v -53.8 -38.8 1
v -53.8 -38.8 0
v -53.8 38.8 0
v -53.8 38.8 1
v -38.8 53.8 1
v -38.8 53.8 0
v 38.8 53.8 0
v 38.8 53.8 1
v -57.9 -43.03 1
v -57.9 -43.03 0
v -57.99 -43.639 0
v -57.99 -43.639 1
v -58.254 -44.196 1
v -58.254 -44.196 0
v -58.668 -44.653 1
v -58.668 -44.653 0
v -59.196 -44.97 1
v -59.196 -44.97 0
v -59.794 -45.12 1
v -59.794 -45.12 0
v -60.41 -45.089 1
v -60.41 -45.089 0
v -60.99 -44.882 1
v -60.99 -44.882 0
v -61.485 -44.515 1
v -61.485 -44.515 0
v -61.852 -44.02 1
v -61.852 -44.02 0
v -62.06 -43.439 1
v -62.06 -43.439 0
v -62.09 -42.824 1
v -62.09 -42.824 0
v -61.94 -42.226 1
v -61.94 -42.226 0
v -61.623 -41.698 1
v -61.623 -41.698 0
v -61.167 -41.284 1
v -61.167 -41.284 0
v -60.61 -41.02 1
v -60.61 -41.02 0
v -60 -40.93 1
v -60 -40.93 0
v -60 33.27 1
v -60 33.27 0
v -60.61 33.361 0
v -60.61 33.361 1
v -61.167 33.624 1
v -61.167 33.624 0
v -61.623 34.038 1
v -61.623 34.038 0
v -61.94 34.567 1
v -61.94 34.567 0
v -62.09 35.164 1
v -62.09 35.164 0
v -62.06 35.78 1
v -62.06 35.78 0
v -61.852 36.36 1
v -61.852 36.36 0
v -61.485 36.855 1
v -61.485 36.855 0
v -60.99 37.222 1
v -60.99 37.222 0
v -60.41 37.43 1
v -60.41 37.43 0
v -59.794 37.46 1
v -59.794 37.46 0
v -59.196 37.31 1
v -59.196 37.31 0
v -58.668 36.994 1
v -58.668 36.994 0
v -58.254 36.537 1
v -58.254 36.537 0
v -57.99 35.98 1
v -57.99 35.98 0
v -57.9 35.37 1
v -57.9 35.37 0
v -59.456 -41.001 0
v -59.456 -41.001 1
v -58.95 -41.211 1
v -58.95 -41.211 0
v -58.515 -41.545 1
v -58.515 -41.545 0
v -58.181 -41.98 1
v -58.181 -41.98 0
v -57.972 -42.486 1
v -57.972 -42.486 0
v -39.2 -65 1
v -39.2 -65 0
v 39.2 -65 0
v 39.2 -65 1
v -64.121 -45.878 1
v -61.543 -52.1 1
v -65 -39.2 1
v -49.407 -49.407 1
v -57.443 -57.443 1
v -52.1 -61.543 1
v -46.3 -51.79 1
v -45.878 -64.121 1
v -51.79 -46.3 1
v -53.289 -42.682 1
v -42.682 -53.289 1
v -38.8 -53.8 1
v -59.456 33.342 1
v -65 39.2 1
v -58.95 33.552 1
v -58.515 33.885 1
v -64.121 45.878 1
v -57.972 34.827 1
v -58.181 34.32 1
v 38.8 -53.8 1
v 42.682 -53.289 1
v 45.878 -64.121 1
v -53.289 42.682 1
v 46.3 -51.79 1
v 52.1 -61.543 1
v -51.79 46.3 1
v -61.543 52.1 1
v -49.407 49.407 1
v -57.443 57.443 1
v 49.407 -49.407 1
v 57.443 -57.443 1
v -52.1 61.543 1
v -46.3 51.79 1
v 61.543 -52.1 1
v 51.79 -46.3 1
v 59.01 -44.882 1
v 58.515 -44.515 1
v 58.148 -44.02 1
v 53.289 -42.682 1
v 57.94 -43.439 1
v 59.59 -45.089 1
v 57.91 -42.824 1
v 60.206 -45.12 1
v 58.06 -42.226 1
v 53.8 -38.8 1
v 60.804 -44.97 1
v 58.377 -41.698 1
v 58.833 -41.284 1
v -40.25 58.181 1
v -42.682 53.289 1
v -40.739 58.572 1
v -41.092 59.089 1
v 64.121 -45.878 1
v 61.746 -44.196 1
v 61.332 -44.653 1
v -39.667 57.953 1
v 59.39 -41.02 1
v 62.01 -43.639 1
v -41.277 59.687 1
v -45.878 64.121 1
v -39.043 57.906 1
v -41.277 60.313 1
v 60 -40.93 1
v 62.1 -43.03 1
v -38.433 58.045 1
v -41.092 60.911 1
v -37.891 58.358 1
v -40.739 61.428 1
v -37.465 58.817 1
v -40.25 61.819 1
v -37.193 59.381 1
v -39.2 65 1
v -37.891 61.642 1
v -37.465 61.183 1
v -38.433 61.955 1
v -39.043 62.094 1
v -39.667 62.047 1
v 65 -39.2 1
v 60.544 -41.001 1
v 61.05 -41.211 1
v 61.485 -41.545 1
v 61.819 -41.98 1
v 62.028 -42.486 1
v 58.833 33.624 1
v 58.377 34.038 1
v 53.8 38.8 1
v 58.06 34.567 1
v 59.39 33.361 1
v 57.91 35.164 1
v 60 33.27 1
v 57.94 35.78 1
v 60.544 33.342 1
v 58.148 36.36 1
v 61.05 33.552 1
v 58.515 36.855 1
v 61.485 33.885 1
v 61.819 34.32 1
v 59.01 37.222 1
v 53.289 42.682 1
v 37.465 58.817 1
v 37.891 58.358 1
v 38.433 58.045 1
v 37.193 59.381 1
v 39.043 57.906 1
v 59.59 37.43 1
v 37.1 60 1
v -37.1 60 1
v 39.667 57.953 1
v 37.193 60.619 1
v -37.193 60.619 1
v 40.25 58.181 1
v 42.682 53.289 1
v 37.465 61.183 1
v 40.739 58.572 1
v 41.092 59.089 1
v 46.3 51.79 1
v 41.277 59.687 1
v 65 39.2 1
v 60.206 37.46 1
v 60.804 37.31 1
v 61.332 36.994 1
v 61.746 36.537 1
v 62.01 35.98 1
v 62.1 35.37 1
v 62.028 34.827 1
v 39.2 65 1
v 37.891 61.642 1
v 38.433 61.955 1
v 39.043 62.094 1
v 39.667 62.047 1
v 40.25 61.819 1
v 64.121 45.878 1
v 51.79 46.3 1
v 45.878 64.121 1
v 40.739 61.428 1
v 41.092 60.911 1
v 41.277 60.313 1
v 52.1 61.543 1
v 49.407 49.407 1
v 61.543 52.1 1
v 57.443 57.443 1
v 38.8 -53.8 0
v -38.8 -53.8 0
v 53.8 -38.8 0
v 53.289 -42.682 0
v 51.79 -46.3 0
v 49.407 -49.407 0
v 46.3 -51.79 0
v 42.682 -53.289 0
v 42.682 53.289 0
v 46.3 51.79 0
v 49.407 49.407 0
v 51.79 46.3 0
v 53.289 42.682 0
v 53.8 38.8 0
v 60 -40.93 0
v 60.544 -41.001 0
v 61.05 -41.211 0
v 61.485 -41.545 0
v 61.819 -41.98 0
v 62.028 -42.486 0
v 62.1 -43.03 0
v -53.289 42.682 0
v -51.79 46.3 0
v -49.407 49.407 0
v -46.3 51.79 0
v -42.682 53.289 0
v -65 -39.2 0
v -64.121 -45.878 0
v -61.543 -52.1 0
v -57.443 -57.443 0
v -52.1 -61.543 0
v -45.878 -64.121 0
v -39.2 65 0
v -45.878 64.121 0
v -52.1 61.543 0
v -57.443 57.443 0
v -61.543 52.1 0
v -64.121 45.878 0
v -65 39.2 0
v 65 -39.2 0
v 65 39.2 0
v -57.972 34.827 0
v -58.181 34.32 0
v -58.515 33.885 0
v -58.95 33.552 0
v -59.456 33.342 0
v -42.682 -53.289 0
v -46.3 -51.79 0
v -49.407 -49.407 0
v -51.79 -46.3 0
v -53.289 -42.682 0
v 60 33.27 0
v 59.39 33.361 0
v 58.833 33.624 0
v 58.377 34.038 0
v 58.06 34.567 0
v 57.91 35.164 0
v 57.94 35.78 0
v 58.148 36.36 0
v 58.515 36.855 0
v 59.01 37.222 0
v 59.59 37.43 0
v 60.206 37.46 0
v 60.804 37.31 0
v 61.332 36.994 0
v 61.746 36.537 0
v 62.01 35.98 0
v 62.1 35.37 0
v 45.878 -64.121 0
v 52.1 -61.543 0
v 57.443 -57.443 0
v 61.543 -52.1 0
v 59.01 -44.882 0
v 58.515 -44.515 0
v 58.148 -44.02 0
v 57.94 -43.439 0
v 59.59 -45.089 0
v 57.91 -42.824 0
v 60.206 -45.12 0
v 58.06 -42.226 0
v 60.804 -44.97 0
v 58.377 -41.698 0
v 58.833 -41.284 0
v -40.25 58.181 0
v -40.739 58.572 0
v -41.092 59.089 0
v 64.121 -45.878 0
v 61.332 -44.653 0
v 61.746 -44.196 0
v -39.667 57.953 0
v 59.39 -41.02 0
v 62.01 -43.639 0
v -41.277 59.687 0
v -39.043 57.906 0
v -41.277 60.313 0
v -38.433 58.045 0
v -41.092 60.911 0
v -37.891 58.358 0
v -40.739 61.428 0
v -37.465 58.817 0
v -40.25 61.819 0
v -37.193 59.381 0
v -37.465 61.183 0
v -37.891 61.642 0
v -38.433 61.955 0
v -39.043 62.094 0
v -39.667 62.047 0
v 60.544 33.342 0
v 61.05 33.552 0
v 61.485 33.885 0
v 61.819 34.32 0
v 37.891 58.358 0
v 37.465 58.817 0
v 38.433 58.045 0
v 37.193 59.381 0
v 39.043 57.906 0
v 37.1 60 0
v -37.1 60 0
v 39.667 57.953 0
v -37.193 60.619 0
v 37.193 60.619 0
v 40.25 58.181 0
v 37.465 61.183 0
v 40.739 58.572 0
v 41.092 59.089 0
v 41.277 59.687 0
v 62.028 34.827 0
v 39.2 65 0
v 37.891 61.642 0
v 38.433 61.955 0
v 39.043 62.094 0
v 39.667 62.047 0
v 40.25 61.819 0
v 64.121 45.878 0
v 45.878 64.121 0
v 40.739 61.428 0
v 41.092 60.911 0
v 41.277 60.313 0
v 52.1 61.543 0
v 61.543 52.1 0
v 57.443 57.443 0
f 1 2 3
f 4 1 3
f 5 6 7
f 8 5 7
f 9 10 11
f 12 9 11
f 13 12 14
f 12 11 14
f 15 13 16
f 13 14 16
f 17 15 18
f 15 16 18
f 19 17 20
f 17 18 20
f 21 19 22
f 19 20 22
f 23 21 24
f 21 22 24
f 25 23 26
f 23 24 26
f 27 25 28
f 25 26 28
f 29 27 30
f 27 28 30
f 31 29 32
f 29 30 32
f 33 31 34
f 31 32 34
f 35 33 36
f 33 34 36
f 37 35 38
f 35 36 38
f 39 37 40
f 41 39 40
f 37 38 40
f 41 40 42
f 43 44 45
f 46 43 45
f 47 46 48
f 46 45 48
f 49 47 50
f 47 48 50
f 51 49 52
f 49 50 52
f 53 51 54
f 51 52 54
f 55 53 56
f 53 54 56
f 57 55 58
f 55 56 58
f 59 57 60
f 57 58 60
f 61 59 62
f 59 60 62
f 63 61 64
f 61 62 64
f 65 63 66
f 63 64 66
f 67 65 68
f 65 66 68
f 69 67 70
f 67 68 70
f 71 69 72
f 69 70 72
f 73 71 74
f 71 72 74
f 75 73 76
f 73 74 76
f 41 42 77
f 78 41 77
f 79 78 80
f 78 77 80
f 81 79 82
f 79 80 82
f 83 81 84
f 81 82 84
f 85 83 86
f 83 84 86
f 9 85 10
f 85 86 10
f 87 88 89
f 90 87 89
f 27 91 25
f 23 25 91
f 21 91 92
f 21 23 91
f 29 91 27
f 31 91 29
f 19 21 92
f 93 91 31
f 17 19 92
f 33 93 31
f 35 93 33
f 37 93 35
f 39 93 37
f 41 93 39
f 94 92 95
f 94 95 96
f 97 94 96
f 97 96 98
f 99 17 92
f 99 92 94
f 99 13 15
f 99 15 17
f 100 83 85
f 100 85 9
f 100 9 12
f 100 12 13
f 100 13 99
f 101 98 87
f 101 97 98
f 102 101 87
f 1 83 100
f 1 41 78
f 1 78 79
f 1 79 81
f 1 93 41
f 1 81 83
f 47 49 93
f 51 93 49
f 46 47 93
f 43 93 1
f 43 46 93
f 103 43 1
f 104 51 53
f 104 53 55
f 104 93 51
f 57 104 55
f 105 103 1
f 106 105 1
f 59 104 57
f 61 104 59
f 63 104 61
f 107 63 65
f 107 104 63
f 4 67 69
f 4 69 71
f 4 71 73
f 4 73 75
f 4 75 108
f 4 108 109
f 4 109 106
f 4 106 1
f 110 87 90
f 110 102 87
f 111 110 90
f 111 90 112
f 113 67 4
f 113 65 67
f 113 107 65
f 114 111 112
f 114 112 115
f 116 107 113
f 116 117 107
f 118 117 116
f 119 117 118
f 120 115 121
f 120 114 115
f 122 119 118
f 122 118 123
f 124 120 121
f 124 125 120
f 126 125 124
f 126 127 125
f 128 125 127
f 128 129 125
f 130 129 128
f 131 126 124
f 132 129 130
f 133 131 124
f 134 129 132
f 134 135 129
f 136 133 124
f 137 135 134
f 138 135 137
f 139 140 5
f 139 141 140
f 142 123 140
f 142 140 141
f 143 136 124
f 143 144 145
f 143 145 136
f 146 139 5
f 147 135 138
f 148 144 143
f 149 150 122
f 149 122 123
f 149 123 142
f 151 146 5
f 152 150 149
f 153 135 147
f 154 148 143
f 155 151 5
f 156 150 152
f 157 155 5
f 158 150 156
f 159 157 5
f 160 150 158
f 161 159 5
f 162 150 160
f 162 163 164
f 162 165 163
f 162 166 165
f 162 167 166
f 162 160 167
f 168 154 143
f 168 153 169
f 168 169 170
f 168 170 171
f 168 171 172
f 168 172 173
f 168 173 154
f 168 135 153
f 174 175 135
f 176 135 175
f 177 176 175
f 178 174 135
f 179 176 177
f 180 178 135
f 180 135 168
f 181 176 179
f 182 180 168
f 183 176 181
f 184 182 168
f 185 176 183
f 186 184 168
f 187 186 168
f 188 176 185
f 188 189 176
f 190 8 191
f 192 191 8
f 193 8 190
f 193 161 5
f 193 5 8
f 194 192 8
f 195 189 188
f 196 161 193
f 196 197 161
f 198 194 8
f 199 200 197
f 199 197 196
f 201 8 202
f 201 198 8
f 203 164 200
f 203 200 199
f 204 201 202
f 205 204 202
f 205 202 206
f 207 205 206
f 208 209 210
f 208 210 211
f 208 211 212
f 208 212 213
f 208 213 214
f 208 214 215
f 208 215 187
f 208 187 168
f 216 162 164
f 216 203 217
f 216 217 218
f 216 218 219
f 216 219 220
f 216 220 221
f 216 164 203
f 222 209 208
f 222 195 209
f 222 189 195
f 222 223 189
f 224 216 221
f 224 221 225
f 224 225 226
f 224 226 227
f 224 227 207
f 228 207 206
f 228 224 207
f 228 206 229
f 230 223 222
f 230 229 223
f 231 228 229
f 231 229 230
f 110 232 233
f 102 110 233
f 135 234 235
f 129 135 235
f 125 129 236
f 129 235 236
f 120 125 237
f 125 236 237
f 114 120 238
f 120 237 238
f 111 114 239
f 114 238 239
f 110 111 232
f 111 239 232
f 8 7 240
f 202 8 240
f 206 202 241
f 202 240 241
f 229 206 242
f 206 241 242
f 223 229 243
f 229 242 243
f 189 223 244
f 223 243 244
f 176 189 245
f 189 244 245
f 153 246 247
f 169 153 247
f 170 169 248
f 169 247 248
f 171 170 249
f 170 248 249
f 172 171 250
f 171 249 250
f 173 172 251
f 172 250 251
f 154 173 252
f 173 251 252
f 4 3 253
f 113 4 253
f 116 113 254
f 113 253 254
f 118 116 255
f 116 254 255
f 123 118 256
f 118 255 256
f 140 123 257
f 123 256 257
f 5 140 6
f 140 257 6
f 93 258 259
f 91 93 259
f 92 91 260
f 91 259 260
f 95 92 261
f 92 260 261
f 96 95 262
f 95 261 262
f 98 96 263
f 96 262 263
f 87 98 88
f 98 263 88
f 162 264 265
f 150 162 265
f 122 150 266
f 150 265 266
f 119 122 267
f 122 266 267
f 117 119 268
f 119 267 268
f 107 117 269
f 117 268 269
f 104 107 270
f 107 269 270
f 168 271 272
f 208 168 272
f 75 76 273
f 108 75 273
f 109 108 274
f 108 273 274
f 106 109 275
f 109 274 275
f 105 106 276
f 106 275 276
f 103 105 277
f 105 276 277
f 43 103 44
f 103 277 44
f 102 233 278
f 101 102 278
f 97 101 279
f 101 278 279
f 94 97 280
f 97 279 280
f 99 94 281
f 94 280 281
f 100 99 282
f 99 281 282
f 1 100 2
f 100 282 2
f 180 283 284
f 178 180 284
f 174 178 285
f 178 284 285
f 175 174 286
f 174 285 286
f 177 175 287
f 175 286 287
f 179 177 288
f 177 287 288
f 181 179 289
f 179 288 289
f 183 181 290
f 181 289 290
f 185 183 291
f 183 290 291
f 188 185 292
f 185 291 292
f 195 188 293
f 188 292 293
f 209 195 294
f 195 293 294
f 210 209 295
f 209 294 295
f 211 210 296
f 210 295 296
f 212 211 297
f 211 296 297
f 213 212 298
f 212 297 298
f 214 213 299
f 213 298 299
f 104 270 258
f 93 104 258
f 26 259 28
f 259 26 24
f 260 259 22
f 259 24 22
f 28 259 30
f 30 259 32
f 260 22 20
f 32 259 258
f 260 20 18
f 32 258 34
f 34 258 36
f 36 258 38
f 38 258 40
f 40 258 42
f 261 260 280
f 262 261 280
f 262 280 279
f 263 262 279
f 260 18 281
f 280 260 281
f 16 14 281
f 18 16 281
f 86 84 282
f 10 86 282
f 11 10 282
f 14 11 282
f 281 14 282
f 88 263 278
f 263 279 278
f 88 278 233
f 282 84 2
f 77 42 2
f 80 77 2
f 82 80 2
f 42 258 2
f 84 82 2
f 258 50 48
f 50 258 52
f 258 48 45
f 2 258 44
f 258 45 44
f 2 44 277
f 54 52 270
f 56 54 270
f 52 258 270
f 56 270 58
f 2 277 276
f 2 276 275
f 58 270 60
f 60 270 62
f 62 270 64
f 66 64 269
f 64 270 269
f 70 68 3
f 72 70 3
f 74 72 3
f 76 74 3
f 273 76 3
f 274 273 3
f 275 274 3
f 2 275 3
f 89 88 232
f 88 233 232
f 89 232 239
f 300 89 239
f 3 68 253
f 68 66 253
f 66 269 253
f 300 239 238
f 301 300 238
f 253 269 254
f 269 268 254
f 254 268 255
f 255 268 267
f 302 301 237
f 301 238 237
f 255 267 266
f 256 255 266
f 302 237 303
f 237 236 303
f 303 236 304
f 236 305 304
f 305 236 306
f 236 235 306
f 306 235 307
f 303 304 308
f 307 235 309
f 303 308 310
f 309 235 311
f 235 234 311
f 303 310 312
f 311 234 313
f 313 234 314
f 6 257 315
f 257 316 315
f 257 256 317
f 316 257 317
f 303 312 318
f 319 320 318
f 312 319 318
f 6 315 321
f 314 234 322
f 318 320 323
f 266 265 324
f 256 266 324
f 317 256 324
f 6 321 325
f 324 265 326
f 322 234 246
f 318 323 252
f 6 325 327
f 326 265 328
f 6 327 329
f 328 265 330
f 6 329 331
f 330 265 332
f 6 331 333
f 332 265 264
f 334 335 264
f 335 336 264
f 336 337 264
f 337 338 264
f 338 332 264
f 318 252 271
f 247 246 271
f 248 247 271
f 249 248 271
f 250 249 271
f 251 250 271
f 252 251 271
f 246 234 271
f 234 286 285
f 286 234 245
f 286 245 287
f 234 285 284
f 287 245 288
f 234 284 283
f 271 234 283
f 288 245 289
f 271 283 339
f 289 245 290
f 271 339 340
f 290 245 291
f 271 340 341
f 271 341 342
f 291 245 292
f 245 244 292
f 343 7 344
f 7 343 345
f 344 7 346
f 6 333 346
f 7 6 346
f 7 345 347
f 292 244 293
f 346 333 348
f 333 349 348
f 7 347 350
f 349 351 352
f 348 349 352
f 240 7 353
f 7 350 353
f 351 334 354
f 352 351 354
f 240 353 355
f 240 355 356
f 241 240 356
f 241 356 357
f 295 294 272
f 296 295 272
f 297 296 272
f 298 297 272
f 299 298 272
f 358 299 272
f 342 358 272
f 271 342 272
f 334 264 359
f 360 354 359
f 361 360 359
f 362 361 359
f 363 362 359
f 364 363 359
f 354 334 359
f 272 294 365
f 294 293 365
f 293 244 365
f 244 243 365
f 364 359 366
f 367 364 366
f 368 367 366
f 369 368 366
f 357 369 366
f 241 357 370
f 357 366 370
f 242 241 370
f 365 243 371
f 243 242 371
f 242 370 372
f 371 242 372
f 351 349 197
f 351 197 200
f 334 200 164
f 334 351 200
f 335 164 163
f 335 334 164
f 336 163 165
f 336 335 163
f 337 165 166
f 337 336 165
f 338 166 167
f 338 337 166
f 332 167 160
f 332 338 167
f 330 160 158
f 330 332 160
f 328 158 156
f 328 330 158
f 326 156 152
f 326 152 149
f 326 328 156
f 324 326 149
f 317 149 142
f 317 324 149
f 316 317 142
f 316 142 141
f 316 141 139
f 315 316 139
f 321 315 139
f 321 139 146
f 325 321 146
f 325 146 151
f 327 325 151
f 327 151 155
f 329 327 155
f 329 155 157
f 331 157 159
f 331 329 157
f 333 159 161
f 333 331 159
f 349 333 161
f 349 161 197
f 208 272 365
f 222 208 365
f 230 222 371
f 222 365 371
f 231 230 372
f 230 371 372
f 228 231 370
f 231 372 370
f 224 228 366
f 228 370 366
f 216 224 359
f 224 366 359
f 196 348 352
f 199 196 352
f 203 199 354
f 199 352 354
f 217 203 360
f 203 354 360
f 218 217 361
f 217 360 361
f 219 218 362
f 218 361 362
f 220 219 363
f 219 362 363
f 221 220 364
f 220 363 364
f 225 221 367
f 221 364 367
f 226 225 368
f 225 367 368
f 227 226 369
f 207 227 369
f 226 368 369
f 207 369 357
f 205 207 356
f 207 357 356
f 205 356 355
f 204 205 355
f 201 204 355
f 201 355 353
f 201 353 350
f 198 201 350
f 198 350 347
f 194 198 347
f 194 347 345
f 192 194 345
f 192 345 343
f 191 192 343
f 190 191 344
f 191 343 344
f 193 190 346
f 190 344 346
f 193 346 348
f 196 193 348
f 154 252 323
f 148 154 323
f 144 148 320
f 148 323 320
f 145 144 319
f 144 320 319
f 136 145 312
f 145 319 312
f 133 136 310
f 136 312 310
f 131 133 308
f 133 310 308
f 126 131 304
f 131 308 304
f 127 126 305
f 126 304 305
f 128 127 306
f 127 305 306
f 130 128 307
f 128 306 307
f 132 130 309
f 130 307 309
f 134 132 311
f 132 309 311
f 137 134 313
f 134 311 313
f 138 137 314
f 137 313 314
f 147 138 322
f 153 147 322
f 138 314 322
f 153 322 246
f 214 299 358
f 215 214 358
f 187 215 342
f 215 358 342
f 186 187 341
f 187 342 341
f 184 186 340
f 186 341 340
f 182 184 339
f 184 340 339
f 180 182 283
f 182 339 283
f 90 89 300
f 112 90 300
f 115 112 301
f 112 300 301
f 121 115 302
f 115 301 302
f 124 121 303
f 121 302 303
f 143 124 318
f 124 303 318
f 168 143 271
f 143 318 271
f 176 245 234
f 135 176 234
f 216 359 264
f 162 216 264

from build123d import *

# Parameters (mm, degrees)
F0_R     = 2.1
F1_DEPTH = 1


with BuildPart() as f1:
    # F0 (on Top) → F1 (new body)
    with BuildSketch(Plane.XY):
        with BuildLine():
            ThreePointArc((65, 39.2), (57.4433549546, 57.4433549546), (39.2, 65))
            Line((39.2, 65), (-39.2, 65))
            ThreePointArc((-39.2, 65), (-57.4433549546, 57.4433549546), (-65, 39.2))
            Line((-65, 39.2), (-65, -39.2))
            ThreePointArc((-65, -39.2), (-57.4433549546, -57.4433549546), (-39.2, -65))
            Line((-39.2, -65), (39.2, -65))
            ThreePointArc((39.2, -65), (57.4433549546, -57.4433549546), (65, -39.2))
            Line((65, -39.2), (65, 39.2))
        make_face()
        with BuildLine():
            ThreePointArc((-57.9, -43.029787234), (-61.4849242405, -44.5147114745), (-60, -40.929787234))
            ThreePointArc((-60, -40.929787234), (-58.5150757595, -41.5448629936), (-57.9, -43.029787234))
        make_face(mode=Mode.SUBTRACT)
        with BuildLine():
            ThreePointArc((62.1, -43.029787234), (58.5150757595, -44.5147114745), (60, -40.929787234))
            ThreePointArc((60, -40.929787234), (61.4849242405, -41.5448629936), (62.1, -43.029787234))
        make_face(mode=Mode.SUBTRACT)
        with BuildLine():
            ThreePointArc((-57.9, 35.370212766), (-58.5150757595, 33.8852885255), (-60, 33.270212766))
            ThreePointArc((-60, 33.270212766), (-61.4849242405, 36.8551370064), (-57.9, 35.370212766))
        make_face(mode=Mode.SUBTRACT)
        with Locations((-39.2, 60)):
            Circle(F0_R, mode=Mode.SUBTRACT)
        with BuildLine():
            ThreePointArc((-55, 39.2), (-50.3722871427, 50.3722871427), (-39.2, 55))
            Line((-39.2, 55), (39.2, 55))
            ThreePointArc((39.2, 55), (50.3722871427, 50.3722871427), (55, 39.2))
            Line((55, 39.2), (55, -39.2))
            ThreePointArc((55, -39.2), (50.3722871427, -50.3722871427), (39.2, -55))
            Line((39.2, -55), (-39.2, -55))
            ThreePointArc((-39.2, -55), (-50.3722871427, -50.3722871427), (-55, -39.2))
            Line((-55, -39.2), (-55, 39.2))
        make_face(mode=Mode.SUBTRACT)
        with BuildLine():
            ThreePointArc((62.1, 35.370212766), (61.4849242405, 33.8852885255), (60, 33.270212766))
            ThreePointArc((60, 33.270212766), (58.5150757595, 36.8551370064), (62.1, 35.370212766))
        make_face(mode=Mode.SUBTRACT)
        with BuildLine():
            ThreePointArc((41.3, 60), (39.2, 57.9), (37.1, 60))
            ThreePointArc((37.1, 60), (39.2, 62.1), (41.3, 60))
        make_face(mode=Mode.SUBTRACT)
        with BuildLine():
            Line((39.2, 55), (-39.2, 55))
            ThreePointArc((-39.2, 55), (-50.3722871427, 50.3722871427), (-55, 39.2))
            Line((-55, 39.2), (-55, -39.2))
            ThreePointArc((-55, -39.2), (-50.3722871427, -50.3722871427), (-39.2, -55))
            Line((-39.2, -55), (39.2, -55))
            ThreePointArc((39.2, -55), (50.3722871427, -50.3722871427), (55, -39.2))
            Line((55, -39.2), (55, 39.2))
            ThreePointArc((55, 39.2), (50.3722871427, 50.3722871427), (39.2, 55))
        make_face()
        with BuildLine():
            ThreePointArc((-53.8, 38.8), (-49.4066017178, 49.4066017178), (-38.8, 53.8))
            Line((-38.8, 53.8), (38.8, 53.8))
            ThreePointArc((38.8, 53.8), (49.4066017178, 49.4066017178), (53.8, 38.8))
            Line((53.8, 38.8), (53.8, -38.8))
            ThreePointArc((53.8, -38.8), (49.4066017178, -49.4066017178), (38.8, -53.8))
            Line((38.8, -53.8), (-38.8, -53.8))
            ThreePointArc((-38.8, -53.8), (-49.4066017178, -49.4066017178), (-53.8, -38.8))
            Line((-53.8, -38.8), (-53.8, 38.8))
        make_face(mode=Mode.SUBTRACT)
    extrude(amount=F1_DEPTH)


solid = f1.part
